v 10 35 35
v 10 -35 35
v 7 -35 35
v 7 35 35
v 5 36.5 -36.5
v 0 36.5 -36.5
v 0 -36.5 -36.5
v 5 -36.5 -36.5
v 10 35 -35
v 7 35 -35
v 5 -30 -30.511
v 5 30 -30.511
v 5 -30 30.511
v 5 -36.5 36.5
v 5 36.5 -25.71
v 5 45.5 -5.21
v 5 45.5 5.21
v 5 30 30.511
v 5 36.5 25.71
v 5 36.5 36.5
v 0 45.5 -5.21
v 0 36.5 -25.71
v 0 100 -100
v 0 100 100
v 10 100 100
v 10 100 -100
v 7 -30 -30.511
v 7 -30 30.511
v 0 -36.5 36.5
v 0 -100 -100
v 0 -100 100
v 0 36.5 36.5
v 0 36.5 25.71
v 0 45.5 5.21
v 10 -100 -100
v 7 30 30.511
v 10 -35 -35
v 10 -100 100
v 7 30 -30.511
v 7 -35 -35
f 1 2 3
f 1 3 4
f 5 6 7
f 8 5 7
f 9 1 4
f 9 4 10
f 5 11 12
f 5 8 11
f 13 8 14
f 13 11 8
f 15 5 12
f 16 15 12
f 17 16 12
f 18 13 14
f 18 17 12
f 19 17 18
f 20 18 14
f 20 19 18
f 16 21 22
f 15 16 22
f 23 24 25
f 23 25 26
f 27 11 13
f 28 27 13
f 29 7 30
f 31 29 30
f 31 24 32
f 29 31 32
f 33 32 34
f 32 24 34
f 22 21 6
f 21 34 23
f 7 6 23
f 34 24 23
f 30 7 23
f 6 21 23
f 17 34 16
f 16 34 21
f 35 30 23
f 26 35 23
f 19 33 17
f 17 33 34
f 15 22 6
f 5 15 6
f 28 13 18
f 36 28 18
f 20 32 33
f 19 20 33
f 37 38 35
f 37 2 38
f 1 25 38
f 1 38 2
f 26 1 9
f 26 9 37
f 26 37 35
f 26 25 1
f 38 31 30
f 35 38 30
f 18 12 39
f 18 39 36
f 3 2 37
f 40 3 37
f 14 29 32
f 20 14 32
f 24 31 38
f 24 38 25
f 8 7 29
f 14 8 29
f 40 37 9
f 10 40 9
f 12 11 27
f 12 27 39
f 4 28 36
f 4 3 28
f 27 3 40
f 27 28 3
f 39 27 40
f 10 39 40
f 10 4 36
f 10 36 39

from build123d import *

# Parameters (mm, degrees)
SKETCH1_W           = 200
SKETCH1_H           = 200
BOSS_EXTRUDE1_DEPTH = 10
CUT_EXTRUDE1_DEPTH  = 5
SKETCH3_W           = 61.021512422
SKETCH3_H           = 60
CUT_EXTRUDE2_DEPTH  = 142.509716981
SKETCH4_W           = 70
SKETCH4_H           = 70
CUT_EXTRUDE3_DEPTH  = 3


with BuildPart() as part:
    # Sketch1 → Boss-Extrude1 (new body)
    with BuildSketch(Plane(origin=(0, 0, 0), x_dir=(0, 0, -1), z_dir=(1, 0, 0))):
        Rectangle(SKETCH1_W, SKETCH1_H)
    extrude(amount=BOSS_EXTRUDE1_DEPTH)

    # Sketch2 → Cut-Extrude1 (cut)
    with BuildSketch(Plane.ZY):
        Polygon((36.5, -36.5), (36.5, 36.5), (25.709845909, 36.5), (5.209845909, 45.5), (-5.209845909, 45.5), (-25.709845909, 36.5), (-36.5, 36.5), (-36.5, -36.5), align=None)
    extrude(amount=-CUT_EXTRUDE1_DEPTH, mode=Mode.SUBTRACT)

    # Sketch3 → Cut-Extrude2 (cut, through all)
    with BuildSketch(Plane.ZY.offset(-5)):
        Rectangle(SKETCH3_W, SKETCH3_H)
    extrude(amount=-CUT_EXTRUDE2_DEPTH, mode=Mode.SUBTRACT)

    # Sketch4 → Cut-Extrude3 (cut)
    with BuildSketch(Plane(origin=(10, 0, 0), x_dir=(0, 0, -1), z_dir=(1, 0, 0))):
        Rectangle(SKETCH4_W, SKETCH4_H)
    extrude(amount=-CUT_EXTRUDE3_DEPTH, mode=Mode.SUBTRACT)


solid = part.part
